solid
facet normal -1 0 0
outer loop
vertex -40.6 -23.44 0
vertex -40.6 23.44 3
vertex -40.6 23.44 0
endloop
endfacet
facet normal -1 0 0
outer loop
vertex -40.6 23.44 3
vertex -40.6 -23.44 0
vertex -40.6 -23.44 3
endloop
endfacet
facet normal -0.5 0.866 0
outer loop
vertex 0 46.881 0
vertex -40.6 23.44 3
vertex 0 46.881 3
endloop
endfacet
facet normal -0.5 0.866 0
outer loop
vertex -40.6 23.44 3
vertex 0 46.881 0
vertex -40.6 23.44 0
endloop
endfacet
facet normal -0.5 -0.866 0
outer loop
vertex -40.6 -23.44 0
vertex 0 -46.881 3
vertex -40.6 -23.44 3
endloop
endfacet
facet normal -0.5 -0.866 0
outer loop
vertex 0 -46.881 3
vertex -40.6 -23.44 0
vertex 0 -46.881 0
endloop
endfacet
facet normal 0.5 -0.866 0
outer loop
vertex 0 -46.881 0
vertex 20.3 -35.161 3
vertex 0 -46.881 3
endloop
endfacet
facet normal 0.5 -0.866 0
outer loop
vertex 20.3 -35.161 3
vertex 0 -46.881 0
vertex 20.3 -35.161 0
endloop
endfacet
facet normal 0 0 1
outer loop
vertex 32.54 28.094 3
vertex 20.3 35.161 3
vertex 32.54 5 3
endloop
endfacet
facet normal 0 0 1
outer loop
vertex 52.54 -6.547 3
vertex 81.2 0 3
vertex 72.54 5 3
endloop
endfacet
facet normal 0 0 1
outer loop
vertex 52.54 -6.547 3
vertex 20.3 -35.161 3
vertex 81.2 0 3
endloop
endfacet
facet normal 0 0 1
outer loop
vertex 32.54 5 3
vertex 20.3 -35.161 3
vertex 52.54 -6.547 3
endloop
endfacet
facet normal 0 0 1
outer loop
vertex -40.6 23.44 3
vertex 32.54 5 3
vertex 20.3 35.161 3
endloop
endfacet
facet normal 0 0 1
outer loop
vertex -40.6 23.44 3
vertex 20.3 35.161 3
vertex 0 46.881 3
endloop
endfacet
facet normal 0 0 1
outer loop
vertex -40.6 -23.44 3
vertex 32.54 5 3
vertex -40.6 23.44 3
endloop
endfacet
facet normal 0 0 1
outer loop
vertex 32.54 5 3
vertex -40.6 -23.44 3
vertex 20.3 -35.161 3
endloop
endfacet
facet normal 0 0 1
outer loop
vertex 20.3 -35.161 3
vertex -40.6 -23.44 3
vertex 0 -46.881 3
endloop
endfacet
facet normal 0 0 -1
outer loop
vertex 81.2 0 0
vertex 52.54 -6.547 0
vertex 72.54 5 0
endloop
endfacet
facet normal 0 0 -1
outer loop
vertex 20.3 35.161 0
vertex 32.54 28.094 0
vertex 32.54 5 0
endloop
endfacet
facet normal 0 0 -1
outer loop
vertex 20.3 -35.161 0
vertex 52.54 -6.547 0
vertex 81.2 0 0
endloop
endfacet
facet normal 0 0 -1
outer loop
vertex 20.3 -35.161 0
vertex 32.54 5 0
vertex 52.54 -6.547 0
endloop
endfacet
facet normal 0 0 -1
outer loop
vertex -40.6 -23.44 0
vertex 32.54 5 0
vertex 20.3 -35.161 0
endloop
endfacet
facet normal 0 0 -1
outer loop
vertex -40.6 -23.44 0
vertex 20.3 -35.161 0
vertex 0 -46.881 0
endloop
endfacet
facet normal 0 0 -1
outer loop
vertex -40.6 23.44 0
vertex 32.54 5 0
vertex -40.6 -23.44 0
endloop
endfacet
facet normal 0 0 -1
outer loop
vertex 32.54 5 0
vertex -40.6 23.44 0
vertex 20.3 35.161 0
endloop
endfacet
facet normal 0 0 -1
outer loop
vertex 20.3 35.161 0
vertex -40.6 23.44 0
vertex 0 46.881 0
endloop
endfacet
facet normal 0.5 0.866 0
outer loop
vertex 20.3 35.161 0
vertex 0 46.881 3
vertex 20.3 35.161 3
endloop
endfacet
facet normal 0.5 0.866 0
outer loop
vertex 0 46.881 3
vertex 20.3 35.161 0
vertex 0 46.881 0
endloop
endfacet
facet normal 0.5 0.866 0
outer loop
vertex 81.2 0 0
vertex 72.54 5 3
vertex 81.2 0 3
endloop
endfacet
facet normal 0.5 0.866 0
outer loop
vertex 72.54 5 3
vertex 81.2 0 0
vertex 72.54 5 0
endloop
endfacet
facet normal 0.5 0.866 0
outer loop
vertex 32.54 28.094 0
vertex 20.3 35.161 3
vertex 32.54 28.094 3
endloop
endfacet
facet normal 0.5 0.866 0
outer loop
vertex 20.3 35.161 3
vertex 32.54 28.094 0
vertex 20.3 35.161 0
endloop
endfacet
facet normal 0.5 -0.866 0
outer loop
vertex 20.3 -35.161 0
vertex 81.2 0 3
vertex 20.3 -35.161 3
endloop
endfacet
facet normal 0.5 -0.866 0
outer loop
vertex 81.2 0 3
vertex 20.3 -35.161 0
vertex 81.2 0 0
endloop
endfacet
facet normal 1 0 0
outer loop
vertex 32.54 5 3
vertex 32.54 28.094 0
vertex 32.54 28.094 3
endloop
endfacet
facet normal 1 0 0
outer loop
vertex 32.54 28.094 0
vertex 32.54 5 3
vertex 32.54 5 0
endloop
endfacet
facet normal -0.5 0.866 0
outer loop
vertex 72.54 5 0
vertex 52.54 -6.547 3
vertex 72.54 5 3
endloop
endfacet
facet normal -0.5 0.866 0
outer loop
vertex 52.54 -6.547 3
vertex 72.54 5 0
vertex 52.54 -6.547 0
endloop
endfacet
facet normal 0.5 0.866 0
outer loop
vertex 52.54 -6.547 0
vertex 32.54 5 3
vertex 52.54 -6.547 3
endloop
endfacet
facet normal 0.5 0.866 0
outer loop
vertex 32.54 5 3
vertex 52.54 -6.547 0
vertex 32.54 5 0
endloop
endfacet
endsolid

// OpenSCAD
unit = 25.4;
TapeID = 3;
Width=1;

tape_id = TapeID * unit;
tape_width=Width*unit+2;

module tape(w=25.4,t=10){
    difference(){
        cylinder(d=tape_id+t*2,h=w,center=true);
        cylinder(d=tape_id,h=w+2,center=true);
    }
}


module base(){
    base_diameter = tape_id + 5;
    //cylinder(d=tape_id,h=tape_width);
    difference(){
        union(){
            rotate([0,0,90]) cylinder(d=base_diameter*1/sin(60),h=3,$fn=6);
            translate([base_diameter/2,0,0]) cylinder(d=base_diameter,h=3,$fn=3);
        }
        p=40;
        x=p/cos(30)/4+5;
        translate([base_diameter-x/tan(30),x,-.1]) hull() {
            rotate([0,0,30] ) cylinder(d=p/cos(30),h=4, $fn=6);
//            %rotate([0,0,30]) translate([-10,0,0]) cylinder(d=p/cos(30),h=4, $fn=6);
//            % translate([0,10,0]) rotate([0,0,30])cylinder(d=p/cos(30),h=4, $fn=6);
            %cylinder(d=20,h=5);
        }
    }
}


%translate([0,0,unit/2+.1])%tape();
base();
